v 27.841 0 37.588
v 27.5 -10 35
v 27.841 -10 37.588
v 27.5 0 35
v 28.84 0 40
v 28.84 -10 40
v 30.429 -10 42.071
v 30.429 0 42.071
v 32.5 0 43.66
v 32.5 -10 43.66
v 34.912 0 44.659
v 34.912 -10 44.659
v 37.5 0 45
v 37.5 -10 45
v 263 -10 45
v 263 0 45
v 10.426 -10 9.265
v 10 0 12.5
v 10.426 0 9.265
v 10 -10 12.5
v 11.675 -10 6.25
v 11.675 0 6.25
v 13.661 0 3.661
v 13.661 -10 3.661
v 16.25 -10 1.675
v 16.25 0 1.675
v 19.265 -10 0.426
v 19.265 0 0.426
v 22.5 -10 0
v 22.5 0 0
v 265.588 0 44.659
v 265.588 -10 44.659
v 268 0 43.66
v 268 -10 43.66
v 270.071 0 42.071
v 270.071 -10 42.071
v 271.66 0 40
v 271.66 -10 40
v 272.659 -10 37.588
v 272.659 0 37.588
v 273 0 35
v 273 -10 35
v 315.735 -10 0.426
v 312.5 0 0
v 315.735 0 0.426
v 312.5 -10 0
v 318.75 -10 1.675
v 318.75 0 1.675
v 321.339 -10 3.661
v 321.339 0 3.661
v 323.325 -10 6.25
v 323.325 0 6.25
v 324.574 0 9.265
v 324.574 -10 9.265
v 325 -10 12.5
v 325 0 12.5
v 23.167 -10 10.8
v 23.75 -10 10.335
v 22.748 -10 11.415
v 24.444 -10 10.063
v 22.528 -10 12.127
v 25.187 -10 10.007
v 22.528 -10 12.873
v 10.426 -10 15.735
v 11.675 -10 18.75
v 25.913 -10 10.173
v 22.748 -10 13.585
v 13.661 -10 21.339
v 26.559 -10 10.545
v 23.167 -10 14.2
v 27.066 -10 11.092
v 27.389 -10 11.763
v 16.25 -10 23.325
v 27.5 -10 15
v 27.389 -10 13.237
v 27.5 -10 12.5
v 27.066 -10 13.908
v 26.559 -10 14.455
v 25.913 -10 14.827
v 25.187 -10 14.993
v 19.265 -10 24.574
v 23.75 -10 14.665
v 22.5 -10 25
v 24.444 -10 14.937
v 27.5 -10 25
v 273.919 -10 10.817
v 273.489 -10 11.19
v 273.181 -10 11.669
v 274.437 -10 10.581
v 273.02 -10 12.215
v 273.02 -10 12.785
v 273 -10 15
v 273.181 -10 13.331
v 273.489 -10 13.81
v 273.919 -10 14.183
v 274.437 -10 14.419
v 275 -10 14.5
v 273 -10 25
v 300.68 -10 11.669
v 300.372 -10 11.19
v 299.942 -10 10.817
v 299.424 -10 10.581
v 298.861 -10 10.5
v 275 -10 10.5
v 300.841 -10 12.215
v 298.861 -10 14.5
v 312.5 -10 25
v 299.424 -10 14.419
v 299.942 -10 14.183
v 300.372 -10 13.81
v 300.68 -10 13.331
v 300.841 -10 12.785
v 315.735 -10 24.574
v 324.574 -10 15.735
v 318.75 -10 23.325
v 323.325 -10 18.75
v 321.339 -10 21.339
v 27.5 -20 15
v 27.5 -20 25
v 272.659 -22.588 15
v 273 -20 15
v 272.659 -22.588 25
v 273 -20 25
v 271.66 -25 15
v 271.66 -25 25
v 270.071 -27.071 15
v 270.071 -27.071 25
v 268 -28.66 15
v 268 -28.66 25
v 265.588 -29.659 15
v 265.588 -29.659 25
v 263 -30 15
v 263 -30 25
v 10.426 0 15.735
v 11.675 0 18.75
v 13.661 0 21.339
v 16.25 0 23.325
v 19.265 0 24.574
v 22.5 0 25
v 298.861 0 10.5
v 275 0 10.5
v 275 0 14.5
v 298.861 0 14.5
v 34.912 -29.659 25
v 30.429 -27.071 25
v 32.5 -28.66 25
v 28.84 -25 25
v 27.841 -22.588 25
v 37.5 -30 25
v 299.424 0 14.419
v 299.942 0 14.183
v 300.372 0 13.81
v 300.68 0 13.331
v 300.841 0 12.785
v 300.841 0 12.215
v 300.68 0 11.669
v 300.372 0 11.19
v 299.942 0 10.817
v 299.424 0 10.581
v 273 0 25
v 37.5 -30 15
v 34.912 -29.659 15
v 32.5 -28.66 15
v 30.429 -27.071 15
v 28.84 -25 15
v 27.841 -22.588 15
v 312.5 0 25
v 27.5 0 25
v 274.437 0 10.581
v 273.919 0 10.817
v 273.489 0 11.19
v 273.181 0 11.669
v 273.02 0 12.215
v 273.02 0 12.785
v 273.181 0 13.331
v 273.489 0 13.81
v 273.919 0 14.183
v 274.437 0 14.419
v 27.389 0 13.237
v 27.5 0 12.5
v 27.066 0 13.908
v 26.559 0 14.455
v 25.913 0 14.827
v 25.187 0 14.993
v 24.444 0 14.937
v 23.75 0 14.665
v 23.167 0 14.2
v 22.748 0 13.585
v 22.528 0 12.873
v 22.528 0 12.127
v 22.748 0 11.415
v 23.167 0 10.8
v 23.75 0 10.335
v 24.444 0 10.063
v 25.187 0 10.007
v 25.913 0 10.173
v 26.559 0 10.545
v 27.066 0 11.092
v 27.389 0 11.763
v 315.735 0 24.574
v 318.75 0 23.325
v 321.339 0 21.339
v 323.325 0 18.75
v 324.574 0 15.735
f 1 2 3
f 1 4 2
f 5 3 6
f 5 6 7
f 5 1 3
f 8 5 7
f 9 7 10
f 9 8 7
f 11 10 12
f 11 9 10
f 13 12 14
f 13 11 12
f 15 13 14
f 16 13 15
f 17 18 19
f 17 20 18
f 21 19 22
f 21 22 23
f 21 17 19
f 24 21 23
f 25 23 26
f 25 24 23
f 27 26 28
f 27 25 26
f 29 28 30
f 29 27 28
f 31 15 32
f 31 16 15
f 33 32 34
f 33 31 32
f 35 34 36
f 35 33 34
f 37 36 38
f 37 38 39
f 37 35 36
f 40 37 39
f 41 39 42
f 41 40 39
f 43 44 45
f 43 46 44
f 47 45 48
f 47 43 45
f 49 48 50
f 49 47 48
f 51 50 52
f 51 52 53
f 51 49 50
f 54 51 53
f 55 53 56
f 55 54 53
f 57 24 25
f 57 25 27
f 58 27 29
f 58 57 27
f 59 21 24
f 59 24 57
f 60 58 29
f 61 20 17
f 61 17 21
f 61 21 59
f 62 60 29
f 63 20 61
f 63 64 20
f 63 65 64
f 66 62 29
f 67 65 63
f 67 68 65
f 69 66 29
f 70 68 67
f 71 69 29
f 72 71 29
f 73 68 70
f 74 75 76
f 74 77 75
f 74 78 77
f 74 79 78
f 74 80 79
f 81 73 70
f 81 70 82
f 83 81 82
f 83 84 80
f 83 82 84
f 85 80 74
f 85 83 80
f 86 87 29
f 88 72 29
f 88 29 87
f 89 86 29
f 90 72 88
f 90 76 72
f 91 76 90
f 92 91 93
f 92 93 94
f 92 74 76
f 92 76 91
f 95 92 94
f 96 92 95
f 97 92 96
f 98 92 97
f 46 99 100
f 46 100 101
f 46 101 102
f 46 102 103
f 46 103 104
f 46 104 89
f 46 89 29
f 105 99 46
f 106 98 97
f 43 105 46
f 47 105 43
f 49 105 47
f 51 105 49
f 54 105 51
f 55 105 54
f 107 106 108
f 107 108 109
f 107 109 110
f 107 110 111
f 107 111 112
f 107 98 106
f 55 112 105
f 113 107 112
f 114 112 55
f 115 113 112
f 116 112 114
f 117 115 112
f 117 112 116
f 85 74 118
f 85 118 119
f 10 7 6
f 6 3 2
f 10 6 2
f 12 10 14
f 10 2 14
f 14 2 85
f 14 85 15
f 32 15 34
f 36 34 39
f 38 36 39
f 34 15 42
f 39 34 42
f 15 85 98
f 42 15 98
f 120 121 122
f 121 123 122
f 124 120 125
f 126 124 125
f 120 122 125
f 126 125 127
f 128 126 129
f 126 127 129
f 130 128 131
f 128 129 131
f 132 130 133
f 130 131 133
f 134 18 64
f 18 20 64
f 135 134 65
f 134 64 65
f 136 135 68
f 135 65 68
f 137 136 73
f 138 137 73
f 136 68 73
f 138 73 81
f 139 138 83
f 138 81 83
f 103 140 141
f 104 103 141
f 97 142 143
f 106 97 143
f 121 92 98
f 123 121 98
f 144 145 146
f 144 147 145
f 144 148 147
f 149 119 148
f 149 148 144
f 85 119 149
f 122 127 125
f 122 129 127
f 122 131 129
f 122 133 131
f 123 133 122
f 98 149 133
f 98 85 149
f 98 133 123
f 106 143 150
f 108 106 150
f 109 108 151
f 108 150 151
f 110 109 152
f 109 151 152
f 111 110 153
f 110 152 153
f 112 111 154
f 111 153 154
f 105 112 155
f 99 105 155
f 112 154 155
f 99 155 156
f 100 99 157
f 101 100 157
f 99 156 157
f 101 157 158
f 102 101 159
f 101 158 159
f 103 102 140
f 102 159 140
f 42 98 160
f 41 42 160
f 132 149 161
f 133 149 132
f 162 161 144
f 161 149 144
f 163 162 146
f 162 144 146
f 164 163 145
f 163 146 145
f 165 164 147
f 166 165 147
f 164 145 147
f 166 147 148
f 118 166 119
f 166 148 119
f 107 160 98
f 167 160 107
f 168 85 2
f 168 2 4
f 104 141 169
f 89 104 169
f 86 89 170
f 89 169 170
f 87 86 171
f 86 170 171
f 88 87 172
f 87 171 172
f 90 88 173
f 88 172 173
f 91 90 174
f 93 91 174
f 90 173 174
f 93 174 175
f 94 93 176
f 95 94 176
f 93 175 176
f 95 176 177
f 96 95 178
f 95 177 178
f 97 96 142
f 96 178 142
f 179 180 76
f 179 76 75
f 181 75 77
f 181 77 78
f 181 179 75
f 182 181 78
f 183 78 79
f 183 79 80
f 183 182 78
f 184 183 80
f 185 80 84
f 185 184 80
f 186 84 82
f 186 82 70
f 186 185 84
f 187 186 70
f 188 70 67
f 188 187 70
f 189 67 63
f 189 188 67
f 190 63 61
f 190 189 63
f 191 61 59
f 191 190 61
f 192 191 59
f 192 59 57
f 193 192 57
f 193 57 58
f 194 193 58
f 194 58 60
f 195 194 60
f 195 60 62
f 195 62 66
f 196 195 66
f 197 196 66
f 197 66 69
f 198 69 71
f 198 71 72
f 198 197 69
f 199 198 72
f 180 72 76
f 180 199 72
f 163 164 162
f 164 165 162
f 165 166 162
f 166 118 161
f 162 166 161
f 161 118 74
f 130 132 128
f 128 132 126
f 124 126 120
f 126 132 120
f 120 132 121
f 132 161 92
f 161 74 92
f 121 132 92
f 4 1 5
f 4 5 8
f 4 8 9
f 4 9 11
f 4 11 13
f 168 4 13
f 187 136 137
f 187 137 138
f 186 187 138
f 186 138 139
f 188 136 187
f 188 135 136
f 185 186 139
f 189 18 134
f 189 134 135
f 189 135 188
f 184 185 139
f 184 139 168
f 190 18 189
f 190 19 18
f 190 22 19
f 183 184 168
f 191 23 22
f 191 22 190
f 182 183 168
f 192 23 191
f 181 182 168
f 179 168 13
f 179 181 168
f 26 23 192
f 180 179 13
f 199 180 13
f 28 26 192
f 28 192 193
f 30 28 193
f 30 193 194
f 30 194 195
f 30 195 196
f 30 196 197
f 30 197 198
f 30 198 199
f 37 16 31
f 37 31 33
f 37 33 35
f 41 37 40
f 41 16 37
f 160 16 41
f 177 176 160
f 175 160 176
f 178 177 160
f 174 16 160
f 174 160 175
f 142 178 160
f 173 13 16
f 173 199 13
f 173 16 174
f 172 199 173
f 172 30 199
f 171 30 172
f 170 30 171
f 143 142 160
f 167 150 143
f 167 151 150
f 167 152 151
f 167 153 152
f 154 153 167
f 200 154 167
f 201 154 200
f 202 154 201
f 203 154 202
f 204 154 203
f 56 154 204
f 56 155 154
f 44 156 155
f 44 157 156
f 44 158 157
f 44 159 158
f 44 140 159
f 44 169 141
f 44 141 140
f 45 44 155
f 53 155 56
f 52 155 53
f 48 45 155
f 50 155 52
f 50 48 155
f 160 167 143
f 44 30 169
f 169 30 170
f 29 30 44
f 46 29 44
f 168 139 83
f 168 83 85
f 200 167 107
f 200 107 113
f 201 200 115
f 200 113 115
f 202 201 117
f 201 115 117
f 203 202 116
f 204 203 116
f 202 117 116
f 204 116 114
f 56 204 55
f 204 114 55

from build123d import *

# Parameters (mm, degrees)
F0_W     = 315
F0_H     = 25
F0_R     = 2.5
F1_DEPTH = 10
F2_R     = 12.49999
F3_W     = 245.5
F3_H     = 10
F4_DEPTH = 20
F5_W     = 245.5
F5_H     = 10
F6_DEPTH = 20
F7_R     = 10
F8_R     = 10


# Not quite as in the source:
# - a fillet or chamfer is up to 0.001 mm smaller than in the source, because OpenCascade refuses the exact size


with BuildPart() as f1:
    # F0 (on Front) → F1 (new body)
    with BuildSketch(Plane.XZ):
        with Locations((167.5, 12.5)):
            Rectangle(F0_W, F0_H)
        with Locations((25, 12.5)):
            Circle(F0_R, mode=Mode.SUBTRACT)
        with BuildLine():
            ThreePointArc((298.861, 14.5), (300.861, 12.5), (298.861, 10.5))
            Line((298.861, 10.5), (275, 10.5))
            ThreePointArc((275, 10.5), (273, 12.5), (275, 14.5))
            Line((275, 14.5), (298.861, 14.5))
        make_face(mode=Mode.SUBTRACT)
    extrude(amount=F1_DEPTH)

    # F2 (radius 12.5 in the source; OpenCascade refuses exactly that, so slightly less here)
    f2_edges = [f1.edges().sort_by_distance(p)[0] for p in [
        (10, -5, 25),
        (10, -5, 0),
        (325, -5, 0),
        (325, -5, 25),
    ]]
    fillet(f2_edges, radius=F2_R)

    # F3 (on face) → F4 (join)
    with BuildSketch(Plane.XZ.offset(10)):
        with Locations((150.25, 20)):
            Rectangle(F3_W, F3_H)
    extrude(amount=F4_DEPTH)

    # F5 (on face) → F6 (join)
    with BuildSketch(Plane.XY.offset(25)):
        with Locations((150.25, -5)):
            Rectangle(F5_W, F5_H)
    extrude(amount=F6_DEPTH)

    # F7
    f7_edges = [f1.edges().sort_by_distance(p)[0] for p in [
        (27.5, -5, 45),
    ]]
    fillet(f7_edges, radius=F7_R)

    # F8
    f8_edges = [f1.edges().sort_by_distance(p)[0] for p in [
        (273, -5, 45),
        (273, -30, 20),
        (27.5, -30, 20),
    ]]
    fillet(f8_edges, radius=F8_R)


solid = f1.part
